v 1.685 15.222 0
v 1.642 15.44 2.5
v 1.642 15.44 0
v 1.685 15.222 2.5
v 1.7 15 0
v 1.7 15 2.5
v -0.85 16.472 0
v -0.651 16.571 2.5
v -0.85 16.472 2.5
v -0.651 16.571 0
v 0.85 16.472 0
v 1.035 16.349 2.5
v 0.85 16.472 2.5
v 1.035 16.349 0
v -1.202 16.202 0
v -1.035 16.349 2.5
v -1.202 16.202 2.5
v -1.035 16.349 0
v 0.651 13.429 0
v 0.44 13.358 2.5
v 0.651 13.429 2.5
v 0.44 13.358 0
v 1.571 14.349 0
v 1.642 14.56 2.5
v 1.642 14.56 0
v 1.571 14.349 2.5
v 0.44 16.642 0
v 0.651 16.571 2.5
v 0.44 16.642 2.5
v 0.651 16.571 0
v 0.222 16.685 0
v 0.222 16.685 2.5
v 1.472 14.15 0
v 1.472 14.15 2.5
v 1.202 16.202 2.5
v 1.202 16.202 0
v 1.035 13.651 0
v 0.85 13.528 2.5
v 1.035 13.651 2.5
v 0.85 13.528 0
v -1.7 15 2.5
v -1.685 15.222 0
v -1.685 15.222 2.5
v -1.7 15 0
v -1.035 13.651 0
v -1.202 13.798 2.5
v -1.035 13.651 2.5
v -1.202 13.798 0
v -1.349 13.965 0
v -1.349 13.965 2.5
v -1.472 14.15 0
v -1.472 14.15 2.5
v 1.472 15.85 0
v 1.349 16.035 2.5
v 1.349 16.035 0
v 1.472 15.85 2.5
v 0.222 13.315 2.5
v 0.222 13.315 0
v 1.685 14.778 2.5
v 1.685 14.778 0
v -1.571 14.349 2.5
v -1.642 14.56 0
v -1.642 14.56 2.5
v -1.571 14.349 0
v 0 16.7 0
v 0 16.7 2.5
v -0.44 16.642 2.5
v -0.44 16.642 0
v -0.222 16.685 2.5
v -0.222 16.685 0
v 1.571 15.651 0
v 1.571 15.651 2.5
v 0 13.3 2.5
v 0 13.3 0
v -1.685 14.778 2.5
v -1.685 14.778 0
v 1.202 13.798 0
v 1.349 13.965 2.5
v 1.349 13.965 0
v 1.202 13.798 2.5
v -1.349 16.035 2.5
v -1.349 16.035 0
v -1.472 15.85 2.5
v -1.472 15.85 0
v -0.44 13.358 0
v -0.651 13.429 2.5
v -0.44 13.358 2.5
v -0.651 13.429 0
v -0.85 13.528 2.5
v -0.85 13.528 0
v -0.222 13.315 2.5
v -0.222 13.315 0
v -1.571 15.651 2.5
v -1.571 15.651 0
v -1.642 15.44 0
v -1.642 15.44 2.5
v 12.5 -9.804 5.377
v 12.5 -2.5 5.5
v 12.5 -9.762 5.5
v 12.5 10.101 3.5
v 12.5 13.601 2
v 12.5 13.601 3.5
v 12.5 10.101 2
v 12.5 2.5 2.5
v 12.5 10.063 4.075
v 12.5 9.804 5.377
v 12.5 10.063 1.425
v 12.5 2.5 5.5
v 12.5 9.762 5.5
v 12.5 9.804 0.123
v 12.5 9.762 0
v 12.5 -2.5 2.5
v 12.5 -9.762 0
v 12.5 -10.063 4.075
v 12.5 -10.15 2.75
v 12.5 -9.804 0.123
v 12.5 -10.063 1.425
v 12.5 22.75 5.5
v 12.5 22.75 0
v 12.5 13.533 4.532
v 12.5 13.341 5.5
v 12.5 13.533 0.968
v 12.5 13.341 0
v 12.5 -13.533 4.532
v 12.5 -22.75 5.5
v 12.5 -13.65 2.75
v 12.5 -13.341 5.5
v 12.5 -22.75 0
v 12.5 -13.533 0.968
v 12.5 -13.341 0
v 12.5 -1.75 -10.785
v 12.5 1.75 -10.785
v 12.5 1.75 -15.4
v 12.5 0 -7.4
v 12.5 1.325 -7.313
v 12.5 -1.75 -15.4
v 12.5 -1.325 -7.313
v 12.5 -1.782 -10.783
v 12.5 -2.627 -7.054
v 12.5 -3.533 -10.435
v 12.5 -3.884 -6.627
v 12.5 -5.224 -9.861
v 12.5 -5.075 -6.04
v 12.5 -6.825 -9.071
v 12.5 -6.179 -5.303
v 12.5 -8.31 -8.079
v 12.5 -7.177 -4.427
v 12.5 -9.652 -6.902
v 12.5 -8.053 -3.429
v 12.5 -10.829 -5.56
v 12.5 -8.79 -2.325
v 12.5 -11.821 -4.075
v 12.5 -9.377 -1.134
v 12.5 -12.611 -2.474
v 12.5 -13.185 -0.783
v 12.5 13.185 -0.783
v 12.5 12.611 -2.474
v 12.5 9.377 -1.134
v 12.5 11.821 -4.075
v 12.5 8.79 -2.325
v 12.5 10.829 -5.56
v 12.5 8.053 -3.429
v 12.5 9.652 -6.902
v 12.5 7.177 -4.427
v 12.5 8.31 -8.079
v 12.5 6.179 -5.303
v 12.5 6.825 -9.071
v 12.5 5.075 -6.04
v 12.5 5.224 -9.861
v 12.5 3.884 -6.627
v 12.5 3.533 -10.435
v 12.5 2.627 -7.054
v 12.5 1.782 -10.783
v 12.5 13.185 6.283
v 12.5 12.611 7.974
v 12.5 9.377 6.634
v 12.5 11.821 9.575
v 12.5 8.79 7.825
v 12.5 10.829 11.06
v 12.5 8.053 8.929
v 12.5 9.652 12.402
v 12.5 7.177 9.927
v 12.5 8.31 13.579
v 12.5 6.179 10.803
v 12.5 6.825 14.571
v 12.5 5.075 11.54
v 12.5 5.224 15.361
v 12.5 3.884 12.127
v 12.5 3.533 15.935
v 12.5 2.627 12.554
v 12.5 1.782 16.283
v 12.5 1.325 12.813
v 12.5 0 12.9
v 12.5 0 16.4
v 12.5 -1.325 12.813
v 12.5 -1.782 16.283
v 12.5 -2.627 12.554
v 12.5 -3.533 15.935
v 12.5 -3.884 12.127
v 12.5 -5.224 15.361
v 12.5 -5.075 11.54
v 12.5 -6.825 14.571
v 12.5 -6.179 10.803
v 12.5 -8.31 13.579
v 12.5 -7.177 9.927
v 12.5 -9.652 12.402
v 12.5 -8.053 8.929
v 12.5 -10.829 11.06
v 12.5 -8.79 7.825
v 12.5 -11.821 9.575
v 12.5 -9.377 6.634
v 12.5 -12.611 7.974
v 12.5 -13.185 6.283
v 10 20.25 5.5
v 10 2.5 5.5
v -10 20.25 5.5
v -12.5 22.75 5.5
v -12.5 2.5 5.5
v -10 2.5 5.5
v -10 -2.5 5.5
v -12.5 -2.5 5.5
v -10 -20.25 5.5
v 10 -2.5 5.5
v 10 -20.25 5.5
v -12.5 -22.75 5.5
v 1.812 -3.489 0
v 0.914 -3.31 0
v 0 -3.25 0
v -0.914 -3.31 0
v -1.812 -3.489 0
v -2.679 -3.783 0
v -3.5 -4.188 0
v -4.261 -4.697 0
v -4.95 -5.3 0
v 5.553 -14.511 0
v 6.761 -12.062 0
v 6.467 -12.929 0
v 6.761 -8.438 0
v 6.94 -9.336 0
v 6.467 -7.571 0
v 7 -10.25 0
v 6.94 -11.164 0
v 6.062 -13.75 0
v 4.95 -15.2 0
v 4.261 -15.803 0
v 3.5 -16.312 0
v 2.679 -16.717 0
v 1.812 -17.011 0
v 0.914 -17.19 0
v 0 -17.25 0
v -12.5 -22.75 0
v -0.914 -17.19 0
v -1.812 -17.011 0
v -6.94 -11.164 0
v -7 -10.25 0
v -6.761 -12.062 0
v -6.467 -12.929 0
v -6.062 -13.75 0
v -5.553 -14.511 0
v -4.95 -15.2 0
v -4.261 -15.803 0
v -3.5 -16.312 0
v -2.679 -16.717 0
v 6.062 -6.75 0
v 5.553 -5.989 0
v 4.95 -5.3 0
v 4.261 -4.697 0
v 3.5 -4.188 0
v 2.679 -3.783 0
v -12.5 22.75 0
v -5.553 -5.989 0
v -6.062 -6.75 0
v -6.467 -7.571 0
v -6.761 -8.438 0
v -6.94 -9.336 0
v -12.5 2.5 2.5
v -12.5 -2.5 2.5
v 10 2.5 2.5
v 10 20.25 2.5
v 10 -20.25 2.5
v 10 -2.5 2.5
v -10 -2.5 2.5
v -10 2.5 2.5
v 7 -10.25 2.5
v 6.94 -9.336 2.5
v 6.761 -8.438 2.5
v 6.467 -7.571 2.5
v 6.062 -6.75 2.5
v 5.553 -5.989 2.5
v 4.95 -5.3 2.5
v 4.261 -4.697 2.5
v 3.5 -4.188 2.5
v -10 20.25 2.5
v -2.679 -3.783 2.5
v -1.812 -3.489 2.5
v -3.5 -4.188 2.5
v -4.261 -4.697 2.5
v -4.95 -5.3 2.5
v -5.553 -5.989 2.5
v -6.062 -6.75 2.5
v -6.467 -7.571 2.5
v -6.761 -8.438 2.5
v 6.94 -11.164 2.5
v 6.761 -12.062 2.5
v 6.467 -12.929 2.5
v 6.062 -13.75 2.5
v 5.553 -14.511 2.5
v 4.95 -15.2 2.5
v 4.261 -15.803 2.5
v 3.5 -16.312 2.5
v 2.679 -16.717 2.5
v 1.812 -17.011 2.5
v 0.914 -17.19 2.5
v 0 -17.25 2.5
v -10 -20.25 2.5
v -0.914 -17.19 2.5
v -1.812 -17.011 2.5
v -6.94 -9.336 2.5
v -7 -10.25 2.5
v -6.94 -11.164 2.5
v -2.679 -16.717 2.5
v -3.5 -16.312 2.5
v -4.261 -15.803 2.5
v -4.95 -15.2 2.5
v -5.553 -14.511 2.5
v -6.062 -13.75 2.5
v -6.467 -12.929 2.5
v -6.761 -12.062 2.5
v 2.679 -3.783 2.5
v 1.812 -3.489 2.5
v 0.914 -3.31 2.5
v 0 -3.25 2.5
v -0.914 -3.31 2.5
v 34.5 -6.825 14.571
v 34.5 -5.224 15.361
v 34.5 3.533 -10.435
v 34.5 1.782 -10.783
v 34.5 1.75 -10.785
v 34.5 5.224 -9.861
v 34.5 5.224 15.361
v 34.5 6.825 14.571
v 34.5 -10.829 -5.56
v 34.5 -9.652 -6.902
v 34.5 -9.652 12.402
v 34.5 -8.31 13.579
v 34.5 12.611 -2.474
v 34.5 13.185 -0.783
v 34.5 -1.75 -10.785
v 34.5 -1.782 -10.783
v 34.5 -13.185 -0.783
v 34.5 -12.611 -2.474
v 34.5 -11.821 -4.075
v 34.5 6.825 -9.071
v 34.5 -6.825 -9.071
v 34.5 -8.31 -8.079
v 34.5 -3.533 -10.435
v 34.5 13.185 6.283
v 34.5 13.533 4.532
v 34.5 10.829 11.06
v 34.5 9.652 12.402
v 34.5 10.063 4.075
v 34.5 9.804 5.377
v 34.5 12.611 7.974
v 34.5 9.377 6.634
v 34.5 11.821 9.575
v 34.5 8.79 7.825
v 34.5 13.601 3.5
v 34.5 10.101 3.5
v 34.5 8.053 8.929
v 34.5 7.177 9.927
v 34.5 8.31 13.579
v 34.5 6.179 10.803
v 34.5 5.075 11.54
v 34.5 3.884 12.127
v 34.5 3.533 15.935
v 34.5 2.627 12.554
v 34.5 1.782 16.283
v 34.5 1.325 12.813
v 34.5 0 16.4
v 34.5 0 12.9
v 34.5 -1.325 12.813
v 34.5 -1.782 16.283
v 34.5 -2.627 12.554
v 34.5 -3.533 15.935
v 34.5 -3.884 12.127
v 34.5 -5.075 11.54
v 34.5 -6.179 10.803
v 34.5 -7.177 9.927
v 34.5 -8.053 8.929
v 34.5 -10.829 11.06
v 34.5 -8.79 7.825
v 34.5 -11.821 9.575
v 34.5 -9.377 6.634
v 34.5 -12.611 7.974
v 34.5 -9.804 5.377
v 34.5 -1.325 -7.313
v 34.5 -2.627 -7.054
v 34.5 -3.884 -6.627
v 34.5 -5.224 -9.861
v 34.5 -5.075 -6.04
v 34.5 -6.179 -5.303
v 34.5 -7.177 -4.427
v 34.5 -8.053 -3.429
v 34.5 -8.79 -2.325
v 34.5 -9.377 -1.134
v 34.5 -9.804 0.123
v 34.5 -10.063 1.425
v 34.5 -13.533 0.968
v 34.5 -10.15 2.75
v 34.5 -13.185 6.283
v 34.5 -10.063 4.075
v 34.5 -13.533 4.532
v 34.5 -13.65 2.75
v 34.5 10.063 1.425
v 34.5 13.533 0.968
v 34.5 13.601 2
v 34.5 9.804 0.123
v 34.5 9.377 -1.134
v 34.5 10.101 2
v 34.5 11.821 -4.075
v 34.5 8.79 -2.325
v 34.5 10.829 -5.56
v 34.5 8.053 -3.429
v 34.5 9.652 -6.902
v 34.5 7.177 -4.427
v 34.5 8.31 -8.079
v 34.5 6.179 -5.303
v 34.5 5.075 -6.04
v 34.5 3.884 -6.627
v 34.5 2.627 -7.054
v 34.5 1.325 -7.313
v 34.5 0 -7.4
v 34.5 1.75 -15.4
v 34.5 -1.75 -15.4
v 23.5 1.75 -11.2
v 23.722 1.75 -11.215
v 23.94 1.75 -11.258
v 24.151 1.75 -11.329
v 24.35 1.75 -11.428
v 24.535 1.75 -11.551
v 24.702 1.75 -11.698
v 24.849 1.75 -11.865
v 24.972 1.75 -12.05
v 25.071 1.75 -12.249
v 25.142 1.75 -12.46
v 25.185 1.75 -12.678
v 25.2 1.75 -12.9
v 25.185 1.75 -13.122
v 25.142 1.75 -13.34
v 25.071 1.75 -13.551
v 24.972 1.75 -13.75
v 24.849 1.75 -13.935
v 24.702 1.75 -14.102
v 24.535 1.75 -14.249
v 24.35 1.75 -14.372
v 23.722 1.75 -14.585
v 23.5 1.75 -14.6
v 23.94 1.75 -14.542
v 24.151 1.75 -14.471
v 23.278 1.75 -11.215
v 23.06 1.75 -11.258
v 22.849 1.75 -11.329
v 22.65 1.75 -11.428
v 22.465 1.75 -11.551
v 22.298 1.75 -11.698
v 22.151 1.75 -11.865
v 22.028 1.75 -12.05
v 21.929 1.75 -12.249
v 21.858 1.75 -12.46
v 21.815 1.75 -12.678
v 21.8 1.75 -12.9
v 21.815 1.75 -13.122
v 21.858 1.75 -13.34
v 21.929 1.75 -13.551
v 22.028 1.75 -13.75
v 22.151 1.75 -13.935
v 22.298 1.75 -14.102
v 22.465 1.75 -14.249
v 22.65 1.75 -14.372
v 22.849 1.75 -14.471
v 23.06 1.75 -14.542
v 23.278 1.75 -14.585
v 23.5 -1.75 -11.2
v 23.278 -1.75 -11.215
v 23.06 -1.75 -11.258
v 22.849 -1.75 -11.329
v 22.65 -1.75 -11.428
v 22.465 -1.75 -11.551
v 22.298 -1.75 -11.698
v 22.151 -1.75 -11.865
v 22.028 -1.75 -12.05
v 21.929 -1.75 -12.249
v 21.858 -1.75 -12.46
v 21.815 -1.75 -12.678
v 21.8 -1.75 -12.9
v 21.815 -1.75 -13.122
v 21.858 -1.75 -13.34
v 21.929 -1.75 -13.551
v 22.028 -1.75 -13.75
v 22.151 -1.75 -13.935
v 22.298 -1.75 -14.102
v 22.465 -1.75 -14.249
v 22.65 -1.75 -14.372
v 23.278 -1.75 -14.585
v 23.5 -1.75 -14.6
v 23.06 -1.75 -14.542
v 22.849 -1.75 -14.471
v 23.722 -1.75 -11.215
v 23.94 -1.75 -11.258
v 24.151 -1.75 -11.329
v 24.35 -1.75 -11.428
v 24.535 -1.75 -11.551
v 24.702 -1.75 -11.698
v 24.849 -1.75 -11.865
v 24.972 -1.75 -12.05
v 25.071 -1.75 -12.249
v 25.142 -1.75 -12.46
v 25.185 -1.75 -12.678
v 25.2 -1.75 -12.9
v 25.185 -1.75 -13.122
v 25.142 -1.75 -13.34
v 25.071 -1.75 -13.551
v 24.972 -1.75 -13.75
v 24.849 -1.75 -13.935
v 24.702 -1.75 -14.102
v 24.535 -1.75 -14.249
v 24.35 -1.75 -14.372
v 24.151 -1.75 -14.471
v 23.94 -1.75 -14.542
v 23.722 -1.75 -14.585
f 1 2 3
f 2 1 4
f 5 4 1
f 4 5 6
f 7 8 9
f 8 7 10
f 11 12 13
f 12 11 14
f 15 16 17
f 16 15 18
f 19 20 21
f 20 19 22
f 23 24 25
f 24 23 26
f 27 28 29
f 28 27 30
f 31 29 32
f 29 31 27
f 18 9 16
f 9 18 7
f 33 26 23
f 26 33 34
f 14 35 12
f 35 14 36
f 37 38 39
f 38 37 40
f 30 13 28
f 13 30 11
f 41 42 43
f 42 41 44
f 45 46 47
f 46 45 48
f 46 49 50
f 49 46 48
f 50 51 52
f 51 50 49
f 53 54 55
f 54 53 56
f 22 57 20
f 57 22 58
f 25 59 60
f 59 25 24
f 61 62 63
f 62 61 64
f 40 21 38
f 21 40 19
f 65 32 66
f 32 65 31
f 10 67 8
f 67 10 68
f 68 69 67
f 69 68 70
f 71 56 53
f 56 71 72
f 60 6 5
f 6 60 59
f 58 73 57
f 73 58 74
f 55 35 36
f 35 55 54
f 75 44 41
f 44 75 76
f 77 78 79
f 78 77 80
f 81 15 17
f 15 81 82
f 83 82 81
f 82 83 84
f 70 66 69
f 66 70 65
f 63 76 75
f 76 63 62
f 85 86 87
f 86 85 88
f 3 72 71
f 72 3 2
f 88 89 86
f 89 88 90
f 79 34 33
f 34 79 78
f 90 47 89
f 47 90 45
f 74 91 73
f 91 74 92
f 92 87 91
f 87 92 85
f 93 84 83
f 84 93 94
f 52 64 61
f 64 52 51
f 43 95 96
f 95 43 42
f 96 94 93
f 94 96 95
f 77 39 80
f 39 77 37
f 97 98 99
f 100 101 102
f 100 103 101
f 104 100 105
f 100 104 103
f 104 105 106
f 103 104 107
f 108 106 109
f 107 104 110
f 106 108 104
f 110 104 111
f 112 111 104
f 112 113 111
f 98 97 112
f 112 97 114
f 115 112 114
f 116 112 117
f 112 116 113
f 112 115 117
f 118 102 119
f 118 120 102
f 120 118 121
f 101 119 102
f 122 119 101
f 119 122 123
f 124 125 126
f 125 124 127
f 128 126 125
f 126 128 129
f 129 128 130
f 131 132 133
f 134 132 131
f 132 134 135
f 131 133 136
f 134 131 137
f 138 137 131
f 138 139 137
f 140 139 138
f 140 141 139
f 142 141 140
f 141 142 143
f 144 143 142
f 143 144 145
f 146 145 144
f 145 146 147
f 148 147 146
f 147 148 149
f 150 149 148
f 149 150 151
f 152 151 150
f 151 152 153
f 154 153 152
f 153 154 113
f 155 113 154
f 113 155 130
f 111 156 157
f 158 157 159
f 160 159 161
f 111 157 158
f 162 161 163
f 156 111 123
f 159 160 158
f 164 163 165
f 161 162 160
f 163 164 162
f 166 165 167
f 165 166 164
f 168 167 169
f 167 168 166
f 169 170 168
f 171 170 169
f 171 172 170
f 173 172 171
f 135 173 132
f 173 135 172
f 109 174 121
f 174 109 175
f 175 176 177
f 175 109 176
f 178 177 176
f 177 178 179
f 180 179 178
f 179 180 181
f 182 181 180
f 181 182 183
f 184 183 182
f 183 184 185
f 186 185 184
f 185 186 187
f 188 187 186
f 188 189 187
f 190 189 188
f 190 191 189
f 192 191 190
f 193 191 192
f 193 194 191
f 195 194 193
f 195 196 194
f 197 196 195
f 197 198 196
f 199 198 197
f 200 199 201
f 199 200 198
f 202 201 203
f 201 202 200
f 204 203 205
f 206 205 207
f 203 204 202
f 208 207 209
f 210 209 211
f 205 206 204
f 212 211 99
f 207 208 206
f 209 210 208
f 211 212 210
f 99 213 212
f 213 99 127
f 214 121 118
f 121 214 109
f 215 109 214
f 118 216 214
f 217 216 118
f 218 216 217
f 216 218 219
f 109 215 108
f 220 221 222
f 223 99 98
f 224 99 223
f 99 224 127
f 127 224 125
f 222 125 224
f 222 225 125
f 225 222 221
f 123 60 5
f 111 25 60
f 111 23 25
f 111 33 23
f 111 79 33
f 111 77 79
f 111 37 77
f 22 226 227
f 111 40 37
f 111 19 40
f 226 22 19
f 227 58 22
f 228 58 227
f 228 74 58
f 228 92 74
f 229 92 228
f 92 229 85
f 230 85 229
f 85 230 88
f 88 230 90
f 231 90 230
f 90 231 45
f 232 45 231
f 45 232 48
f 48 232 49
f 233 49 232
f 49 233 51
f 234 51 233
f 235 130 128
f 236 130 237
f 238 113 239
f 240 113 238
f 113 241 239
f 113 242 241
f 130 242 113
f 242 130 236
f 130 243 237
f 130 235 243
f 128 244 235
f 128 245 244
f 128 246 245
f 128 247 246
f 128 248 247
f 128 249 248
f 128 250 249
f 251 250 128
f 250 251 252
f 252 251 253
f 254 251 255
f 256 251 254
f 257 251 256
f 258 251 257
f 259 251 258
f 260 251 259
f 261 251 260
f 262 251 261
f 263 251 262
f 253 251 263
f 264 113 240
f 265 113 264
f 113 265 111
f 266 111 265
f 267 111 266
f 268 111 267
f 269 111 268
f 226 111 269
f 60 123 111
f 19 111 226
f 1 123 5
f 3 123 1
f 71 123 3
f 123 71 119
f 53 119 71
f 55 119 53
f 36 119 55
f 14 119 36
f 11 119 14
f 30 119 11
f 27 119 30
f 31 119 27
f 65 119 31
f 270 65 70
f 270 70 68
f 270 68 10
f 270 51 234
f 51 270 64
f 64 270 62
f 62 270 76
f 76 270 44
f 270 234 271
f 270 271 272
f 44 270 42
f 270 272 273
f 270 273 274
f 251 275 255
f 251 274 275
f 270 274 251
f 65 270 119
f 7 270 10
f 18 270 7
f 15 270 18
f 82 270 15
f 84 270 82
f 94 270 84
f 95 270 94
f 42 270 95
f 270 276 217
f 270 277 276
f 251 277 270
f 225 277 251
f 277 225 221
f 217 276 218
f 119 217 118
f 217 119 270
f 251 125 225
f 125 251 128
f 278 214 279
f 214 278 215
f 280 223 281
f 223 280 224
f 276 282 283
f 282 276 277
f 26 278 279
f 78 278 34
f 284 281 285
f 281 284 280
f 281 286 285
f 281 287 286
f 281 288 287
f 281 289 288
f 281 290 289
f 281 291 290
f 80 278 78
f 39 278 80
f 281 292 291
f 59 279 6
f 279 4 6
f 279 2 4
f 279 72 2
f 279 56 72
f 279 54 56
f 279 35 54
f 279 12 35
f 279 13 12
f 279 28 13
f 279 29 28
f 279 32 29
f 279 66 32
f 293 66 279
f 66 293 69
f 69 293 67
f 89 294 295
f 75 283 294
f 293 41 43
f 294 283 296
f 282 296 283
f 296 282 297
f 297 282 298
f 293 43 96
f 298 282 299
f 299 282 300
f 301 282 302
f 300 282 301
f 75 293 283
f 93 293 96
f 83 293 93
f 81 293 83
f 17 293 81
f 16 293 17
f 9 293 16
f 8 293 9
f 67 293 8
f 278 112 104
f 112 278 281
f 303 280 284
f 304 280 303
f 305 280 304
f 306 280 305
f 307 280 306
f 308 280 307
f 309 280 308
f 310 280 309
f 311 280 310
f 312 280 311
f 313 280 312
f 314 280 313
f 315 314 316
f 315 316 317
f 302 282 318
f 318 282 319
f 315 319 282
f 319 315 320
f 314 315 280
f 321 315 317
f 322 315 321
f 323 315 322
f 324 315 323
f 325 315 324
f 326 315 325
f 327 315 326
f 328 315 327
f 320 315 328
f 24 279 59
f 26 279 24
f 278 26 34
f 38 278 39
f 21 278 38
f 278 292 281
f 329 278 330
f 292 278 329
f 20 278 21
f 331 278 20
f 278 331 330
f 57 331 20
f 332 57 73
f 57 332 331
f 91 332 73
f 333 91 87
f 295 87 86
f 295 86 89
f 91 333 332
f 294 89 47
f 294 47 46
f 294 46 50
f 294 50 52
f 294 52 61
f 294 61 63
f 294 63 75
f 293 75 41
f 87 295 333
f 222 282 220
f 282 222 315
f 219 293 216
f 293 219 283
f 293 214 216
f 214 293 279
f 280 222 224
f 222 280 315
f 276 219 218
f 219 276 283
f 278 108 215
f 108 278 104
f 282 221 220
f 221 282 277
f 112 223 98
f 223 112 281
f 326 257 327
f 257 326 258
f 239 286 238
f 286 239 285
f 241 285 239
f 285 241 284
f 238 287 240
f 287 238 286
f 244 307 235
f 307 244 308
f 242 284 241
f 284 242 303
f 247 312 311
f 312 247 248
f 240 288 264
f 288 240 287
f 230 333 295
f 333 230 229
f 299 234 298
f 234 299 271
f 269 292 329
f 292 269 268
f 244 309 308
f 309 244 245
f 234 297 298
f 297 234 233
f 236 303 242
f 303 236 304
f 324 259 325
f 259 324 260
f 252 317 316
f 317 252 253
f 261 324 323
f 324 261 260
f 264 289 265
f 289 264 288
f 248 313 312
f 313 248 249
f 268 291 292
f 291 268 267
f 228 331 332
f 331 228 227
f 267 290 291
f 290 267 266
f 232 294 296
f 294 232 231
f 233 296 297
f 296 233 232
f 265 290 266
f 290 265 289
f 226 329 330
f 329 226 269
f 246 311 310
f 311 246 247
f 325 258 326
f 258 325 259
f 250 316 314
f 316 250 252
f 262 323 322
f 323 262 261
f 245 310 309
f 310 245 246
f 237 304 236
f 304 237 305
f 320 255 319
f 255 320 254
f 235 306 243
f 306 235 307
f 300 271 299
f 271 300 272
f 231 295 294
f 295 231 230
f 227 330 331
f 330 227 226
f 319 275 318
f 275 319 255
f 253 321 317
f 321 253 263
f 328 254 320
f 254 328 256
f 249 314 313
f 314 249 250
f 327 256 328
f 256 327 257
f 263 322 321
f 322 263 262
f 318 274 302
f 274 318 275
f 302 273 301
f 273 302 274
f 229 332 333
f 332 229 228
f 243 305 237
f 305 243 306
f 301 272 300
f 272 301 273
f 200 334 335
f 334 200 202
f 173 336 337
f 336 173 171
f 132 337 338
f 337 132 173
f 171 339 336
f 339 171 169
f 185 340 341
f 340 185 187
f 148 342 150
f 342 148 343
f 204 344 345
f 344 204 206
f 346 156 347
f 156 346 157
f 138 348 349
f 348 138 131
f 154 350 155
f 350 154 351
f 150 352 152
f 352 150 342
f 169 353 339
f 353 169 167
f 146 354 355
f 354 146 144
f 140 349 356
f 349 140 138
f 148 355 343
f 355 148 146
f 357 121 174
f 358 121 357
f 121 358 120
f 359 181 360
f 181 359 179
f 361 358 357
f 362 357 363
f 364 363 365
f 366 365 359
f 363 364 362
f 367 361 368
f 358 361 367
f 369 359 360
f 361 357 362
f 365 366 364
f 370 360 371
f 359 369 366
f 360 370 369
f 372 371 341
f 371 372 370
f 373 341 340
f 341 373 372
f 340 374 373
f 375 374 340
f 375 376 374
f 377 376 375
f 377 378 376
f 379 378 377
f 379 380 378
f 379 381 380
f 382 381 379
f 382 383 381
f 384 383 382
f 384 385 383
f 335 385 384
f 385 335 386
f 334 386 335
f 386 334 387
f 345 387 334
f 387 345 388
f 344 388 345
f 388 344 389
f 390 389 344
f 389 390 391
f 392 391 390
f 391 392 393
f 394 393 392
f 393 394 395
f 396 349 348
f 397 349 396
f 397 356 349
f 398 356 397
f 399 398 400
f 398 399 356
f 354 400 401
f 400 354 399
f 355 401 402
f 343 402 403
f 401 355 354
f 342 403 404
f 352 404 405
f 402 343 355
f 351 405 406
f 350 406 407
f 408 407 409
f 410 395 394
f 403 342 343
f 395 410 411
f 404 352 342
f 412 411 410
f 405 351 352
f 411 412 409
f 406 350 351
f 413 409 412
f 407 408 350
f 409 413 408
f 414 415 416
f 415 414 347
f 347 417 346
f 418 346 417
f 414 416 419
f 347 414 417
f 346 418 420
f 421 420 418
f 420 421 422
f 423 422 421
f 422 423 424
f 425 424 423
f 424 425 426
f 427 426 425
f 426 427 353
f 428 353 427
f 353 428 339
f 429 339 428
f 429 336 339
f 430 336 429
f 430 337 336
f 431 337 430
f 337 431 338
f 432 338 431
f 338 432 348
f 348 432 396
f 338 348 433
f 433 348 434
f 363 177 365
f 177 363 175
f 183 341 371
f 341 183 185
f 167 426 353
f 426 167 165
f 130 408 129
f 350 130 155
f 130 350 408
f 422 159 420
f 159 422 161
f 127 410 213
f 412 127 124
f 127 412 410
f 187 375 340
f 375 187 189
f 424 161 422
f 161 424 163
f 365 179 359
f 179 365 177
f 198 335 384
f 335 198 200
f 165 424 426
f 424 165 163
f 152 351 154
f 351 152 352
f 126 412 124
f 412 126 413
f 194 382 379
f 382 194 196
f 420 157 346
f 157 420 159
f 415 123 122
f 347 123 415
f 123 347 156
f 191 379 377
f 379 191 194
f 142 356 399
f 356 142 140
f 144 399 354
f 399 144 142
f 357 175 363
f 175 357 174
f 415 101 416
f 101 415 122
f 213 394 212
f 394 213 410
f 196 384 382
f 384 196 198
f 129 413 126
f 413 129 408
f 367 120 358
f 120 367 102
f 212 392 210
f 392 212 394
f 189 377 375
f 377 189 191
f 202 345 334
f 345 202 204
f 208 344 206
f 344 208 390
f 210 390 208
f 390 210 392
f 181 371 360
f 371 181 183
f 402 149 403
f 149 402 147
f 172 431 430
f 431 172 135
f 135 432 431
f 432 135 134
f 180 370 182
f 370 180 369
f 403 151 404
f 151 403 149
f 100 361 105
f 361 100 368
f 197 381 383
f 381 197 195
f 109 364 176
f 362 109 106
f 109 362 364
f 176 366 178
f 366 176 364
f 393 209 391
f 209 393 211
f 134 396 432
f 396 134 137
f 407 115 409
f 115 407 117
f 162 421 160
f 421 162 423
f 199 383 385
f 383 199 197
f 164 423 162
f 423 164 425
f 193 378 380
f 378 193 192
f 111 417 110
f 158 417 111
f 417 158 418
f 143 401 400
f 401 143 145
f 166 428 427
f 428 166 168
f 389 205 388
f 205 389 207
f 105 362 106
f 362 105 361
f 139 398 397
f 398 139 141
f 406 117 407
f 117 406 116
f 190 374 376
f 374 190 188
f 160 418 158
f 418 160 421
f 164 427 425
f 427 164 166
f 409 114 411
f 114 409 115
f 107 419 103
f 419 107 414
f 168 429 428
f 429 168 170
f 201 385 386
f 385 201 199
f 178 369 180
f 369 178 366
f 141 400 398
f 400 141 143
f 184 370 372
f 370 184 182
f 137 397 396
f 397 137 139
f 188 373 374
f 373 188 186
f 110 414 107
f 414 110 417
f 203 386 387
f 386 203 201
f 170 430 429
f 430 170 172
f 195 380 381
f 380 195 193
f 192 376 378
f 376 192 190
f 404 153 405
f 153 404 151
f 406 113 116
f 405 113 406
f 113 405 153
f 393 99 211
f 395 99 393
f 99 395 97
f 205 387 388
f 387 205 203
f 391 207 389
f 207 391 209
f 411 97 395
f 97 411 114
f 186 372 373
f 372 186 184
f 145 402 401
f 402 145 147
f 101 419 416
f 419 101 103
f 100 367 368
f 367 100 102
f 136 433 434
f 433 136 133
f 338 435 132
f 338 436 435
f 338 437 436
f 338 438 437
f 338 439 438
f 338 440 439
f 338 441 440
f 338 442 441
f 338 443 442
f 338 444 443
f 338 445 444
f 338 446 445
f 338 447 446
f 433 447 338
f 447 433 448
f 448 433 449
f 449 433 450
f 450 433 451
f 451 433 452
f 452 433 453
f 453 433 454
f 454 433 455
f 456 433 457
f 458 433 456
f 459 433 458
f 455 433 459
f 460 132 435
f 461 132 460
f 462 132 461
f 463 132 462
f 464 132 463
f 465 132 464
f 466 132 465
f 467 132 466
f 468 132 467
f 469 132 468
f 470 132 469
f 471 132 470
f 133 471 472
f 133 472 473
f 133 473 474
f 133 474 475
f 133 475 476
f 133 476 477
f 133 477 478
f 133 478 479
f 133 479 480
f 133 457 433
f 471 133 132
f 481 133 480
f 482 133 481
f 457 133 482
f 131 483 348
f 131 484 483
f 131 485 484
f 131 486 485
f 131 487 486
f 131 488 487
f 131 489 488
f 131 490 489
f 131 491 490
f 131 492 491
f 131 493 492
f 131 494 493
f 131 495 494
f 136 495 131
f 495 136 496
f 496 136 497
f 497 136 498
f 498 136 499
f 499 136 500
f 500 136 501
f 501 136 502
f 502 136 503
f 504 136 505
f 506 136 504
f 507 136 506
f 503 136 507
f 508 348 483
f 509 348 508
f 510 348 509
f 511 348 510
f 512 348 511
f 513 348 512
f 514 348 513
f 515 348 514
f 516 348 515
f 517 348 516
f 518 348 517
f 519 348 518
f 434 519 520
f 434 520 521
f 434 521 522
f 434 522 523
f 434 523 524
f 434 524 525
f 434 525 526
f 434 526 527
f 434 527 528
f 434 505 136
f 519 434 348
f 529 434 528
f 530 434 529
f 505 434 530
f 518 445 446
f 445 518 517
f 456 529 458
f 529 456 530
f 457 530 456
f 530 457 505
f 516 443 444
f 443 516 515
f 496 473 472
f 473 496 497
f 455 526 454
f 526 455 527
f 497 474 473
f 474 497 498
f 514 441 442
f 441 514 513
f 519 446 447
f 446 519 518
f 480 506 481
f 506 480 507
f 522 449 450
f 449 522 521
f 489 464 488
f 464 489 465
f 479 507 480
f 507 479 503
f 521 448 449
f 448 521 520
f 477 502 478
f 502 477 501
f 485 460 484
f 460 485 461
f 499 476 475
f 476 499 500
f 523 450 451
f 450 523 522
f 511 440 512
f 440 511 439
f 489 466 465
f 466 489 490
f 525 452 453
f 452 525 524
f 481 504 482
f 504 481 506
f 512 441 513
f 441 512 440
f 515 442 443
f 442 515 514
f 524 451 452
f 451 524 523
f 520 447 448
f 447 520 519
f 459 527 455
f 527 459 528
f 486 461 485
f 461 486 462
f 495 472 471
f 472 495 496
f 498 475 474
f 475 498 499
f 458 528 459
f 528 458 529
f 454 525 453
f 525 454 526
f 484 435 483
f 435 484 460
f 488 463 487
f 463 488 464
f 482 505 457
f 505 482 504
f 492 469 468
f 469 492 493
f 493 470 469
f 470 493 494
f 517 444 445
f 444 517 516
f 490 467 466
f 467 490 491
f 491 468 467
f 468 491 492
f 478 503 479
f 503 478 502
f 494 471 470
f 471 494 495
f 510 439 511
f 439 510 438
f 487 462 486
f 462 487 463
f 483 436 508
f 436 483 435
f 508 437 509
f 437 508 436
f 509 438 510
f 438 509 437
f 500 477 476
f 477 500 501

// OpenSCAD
// ============================================================
// Shoulder Joint Bracket — MG996R servo to 20 mm PVC pipe
// ============================================================
// Mounts an MG996R servo to the torso shoulder post and
// connects the output horn to the upper-arm PVC pipe.
//
// The bracket has two parts:
//   1. Servo clamp — wraps around MG996R body with M3 screws
//   2. PVC pipe collar — receives 20 mm PVC upper-arm tube
//
// Print orientation: flat face down, no supports needed.
// Material: PLA, 80 % infill for rigidity.
// ============================================================

// MG996R body dimensions
srv_w  = 20.0;  // mm
srv_l  = 40.5;  // mm
srv_h  = 36.5;  // mm
tab_l  = 54.5;  // mm — tab-to-tab
tab_h  =  3.0;  // mm — tab thickness
tab_w  =  5.0;  // mm — ear width

// PVC collar
pvc_od  = 20;   // mm
pvc_tol =  0.3; // mm — diametric clearance
collar_h = 22;  // mm — collar length (clamping zone)
collar_w =  3.5;// mm — wall around PVC

// Clamp screw holes (M3)
screw_d  = 3.4; // mm — clearance hole
screw_sep = 30; // mm — between clamp screw centres

wall     = 2.5; // mm
corner_r = 2.0;
$fn = 48;

// ---- Derived -----------------------------------------------
outer_w  = srv_w + 2 * wall;
outer_l  = srv_l + 2 * wall;
outer_h  = tab_h + wall;

pvc_r    = (pvc_od + pvc_tol) / 2;
collar_r = pvc_r + collar_w;

// ============================================================
module servo_clamp_body() {
    difference() {
        // Outer block
        translate([-outer_w/2, -outer_l/2, 0])
            cube([outer_w, outer_l, outer_h]);

        // Servo body cavity
        translate([-srv_w/2, -srv_l/2, wall])
            cube([srv_w, srv_l, srv_h + 1]);

        // Tab recesses
        translate([-tab_l/2, -tab_w/2, wall])
            cube([tab_l, tab_w, tab_h + 0.5]);

        // Clamp screw holes (for tightening around servo body)
        for (dy = [-screw_sep/2, screw_sep/2]) {
            translate([0, dy, -0.1])
                cylinder(r = screw_d/2, h = wall + 0.2);
        }

        // Output-shaft clearance hole (top face)
        translate([0, -srv_l/2 + 10, -0.1])
            cylinder(r = 7, h = wall + 0.2);
    }
}

module pvc_collar() {
    // Horizontal collar extending from the bracket side face
    // so the upper-arm PVC pipe inserts perpendicular to the servo.
    translate([outer_w/2, 0, outer_h/2])
        rotate([0, 90, 0]) {
            difference() {
                cylinder(r = collar_r, h = collar_h);
                // PVC bore
                cylinder(r = pvc_r, h = collar_h + 1);
                // Clamp slot (allows tightening with M3 bolt)
                translate([-0.75, collar_r - collar_w - 0.5, -0.1])
                    cube([1.5, collar_w + 1, collar_h + 0.2]);
            }
            // Clamp ear with M3 bolt hole
            translate([collar_r - 0.5, -collar_w/2, 0])
                difference() {
                    cube([5, collar_w, collar_h]);
                    translate([2.5, collar_w/2, collar_h/2])
                        rotate([90, 0, 0])
                            cylinder(r = screw_d/2, h = collar_w + 1, center = true);
                }
        }
}

// ============================================================
union() {
    color("LightGray") servo_clamp_body();
    color("DarkGray")  pvc_collar();
}
